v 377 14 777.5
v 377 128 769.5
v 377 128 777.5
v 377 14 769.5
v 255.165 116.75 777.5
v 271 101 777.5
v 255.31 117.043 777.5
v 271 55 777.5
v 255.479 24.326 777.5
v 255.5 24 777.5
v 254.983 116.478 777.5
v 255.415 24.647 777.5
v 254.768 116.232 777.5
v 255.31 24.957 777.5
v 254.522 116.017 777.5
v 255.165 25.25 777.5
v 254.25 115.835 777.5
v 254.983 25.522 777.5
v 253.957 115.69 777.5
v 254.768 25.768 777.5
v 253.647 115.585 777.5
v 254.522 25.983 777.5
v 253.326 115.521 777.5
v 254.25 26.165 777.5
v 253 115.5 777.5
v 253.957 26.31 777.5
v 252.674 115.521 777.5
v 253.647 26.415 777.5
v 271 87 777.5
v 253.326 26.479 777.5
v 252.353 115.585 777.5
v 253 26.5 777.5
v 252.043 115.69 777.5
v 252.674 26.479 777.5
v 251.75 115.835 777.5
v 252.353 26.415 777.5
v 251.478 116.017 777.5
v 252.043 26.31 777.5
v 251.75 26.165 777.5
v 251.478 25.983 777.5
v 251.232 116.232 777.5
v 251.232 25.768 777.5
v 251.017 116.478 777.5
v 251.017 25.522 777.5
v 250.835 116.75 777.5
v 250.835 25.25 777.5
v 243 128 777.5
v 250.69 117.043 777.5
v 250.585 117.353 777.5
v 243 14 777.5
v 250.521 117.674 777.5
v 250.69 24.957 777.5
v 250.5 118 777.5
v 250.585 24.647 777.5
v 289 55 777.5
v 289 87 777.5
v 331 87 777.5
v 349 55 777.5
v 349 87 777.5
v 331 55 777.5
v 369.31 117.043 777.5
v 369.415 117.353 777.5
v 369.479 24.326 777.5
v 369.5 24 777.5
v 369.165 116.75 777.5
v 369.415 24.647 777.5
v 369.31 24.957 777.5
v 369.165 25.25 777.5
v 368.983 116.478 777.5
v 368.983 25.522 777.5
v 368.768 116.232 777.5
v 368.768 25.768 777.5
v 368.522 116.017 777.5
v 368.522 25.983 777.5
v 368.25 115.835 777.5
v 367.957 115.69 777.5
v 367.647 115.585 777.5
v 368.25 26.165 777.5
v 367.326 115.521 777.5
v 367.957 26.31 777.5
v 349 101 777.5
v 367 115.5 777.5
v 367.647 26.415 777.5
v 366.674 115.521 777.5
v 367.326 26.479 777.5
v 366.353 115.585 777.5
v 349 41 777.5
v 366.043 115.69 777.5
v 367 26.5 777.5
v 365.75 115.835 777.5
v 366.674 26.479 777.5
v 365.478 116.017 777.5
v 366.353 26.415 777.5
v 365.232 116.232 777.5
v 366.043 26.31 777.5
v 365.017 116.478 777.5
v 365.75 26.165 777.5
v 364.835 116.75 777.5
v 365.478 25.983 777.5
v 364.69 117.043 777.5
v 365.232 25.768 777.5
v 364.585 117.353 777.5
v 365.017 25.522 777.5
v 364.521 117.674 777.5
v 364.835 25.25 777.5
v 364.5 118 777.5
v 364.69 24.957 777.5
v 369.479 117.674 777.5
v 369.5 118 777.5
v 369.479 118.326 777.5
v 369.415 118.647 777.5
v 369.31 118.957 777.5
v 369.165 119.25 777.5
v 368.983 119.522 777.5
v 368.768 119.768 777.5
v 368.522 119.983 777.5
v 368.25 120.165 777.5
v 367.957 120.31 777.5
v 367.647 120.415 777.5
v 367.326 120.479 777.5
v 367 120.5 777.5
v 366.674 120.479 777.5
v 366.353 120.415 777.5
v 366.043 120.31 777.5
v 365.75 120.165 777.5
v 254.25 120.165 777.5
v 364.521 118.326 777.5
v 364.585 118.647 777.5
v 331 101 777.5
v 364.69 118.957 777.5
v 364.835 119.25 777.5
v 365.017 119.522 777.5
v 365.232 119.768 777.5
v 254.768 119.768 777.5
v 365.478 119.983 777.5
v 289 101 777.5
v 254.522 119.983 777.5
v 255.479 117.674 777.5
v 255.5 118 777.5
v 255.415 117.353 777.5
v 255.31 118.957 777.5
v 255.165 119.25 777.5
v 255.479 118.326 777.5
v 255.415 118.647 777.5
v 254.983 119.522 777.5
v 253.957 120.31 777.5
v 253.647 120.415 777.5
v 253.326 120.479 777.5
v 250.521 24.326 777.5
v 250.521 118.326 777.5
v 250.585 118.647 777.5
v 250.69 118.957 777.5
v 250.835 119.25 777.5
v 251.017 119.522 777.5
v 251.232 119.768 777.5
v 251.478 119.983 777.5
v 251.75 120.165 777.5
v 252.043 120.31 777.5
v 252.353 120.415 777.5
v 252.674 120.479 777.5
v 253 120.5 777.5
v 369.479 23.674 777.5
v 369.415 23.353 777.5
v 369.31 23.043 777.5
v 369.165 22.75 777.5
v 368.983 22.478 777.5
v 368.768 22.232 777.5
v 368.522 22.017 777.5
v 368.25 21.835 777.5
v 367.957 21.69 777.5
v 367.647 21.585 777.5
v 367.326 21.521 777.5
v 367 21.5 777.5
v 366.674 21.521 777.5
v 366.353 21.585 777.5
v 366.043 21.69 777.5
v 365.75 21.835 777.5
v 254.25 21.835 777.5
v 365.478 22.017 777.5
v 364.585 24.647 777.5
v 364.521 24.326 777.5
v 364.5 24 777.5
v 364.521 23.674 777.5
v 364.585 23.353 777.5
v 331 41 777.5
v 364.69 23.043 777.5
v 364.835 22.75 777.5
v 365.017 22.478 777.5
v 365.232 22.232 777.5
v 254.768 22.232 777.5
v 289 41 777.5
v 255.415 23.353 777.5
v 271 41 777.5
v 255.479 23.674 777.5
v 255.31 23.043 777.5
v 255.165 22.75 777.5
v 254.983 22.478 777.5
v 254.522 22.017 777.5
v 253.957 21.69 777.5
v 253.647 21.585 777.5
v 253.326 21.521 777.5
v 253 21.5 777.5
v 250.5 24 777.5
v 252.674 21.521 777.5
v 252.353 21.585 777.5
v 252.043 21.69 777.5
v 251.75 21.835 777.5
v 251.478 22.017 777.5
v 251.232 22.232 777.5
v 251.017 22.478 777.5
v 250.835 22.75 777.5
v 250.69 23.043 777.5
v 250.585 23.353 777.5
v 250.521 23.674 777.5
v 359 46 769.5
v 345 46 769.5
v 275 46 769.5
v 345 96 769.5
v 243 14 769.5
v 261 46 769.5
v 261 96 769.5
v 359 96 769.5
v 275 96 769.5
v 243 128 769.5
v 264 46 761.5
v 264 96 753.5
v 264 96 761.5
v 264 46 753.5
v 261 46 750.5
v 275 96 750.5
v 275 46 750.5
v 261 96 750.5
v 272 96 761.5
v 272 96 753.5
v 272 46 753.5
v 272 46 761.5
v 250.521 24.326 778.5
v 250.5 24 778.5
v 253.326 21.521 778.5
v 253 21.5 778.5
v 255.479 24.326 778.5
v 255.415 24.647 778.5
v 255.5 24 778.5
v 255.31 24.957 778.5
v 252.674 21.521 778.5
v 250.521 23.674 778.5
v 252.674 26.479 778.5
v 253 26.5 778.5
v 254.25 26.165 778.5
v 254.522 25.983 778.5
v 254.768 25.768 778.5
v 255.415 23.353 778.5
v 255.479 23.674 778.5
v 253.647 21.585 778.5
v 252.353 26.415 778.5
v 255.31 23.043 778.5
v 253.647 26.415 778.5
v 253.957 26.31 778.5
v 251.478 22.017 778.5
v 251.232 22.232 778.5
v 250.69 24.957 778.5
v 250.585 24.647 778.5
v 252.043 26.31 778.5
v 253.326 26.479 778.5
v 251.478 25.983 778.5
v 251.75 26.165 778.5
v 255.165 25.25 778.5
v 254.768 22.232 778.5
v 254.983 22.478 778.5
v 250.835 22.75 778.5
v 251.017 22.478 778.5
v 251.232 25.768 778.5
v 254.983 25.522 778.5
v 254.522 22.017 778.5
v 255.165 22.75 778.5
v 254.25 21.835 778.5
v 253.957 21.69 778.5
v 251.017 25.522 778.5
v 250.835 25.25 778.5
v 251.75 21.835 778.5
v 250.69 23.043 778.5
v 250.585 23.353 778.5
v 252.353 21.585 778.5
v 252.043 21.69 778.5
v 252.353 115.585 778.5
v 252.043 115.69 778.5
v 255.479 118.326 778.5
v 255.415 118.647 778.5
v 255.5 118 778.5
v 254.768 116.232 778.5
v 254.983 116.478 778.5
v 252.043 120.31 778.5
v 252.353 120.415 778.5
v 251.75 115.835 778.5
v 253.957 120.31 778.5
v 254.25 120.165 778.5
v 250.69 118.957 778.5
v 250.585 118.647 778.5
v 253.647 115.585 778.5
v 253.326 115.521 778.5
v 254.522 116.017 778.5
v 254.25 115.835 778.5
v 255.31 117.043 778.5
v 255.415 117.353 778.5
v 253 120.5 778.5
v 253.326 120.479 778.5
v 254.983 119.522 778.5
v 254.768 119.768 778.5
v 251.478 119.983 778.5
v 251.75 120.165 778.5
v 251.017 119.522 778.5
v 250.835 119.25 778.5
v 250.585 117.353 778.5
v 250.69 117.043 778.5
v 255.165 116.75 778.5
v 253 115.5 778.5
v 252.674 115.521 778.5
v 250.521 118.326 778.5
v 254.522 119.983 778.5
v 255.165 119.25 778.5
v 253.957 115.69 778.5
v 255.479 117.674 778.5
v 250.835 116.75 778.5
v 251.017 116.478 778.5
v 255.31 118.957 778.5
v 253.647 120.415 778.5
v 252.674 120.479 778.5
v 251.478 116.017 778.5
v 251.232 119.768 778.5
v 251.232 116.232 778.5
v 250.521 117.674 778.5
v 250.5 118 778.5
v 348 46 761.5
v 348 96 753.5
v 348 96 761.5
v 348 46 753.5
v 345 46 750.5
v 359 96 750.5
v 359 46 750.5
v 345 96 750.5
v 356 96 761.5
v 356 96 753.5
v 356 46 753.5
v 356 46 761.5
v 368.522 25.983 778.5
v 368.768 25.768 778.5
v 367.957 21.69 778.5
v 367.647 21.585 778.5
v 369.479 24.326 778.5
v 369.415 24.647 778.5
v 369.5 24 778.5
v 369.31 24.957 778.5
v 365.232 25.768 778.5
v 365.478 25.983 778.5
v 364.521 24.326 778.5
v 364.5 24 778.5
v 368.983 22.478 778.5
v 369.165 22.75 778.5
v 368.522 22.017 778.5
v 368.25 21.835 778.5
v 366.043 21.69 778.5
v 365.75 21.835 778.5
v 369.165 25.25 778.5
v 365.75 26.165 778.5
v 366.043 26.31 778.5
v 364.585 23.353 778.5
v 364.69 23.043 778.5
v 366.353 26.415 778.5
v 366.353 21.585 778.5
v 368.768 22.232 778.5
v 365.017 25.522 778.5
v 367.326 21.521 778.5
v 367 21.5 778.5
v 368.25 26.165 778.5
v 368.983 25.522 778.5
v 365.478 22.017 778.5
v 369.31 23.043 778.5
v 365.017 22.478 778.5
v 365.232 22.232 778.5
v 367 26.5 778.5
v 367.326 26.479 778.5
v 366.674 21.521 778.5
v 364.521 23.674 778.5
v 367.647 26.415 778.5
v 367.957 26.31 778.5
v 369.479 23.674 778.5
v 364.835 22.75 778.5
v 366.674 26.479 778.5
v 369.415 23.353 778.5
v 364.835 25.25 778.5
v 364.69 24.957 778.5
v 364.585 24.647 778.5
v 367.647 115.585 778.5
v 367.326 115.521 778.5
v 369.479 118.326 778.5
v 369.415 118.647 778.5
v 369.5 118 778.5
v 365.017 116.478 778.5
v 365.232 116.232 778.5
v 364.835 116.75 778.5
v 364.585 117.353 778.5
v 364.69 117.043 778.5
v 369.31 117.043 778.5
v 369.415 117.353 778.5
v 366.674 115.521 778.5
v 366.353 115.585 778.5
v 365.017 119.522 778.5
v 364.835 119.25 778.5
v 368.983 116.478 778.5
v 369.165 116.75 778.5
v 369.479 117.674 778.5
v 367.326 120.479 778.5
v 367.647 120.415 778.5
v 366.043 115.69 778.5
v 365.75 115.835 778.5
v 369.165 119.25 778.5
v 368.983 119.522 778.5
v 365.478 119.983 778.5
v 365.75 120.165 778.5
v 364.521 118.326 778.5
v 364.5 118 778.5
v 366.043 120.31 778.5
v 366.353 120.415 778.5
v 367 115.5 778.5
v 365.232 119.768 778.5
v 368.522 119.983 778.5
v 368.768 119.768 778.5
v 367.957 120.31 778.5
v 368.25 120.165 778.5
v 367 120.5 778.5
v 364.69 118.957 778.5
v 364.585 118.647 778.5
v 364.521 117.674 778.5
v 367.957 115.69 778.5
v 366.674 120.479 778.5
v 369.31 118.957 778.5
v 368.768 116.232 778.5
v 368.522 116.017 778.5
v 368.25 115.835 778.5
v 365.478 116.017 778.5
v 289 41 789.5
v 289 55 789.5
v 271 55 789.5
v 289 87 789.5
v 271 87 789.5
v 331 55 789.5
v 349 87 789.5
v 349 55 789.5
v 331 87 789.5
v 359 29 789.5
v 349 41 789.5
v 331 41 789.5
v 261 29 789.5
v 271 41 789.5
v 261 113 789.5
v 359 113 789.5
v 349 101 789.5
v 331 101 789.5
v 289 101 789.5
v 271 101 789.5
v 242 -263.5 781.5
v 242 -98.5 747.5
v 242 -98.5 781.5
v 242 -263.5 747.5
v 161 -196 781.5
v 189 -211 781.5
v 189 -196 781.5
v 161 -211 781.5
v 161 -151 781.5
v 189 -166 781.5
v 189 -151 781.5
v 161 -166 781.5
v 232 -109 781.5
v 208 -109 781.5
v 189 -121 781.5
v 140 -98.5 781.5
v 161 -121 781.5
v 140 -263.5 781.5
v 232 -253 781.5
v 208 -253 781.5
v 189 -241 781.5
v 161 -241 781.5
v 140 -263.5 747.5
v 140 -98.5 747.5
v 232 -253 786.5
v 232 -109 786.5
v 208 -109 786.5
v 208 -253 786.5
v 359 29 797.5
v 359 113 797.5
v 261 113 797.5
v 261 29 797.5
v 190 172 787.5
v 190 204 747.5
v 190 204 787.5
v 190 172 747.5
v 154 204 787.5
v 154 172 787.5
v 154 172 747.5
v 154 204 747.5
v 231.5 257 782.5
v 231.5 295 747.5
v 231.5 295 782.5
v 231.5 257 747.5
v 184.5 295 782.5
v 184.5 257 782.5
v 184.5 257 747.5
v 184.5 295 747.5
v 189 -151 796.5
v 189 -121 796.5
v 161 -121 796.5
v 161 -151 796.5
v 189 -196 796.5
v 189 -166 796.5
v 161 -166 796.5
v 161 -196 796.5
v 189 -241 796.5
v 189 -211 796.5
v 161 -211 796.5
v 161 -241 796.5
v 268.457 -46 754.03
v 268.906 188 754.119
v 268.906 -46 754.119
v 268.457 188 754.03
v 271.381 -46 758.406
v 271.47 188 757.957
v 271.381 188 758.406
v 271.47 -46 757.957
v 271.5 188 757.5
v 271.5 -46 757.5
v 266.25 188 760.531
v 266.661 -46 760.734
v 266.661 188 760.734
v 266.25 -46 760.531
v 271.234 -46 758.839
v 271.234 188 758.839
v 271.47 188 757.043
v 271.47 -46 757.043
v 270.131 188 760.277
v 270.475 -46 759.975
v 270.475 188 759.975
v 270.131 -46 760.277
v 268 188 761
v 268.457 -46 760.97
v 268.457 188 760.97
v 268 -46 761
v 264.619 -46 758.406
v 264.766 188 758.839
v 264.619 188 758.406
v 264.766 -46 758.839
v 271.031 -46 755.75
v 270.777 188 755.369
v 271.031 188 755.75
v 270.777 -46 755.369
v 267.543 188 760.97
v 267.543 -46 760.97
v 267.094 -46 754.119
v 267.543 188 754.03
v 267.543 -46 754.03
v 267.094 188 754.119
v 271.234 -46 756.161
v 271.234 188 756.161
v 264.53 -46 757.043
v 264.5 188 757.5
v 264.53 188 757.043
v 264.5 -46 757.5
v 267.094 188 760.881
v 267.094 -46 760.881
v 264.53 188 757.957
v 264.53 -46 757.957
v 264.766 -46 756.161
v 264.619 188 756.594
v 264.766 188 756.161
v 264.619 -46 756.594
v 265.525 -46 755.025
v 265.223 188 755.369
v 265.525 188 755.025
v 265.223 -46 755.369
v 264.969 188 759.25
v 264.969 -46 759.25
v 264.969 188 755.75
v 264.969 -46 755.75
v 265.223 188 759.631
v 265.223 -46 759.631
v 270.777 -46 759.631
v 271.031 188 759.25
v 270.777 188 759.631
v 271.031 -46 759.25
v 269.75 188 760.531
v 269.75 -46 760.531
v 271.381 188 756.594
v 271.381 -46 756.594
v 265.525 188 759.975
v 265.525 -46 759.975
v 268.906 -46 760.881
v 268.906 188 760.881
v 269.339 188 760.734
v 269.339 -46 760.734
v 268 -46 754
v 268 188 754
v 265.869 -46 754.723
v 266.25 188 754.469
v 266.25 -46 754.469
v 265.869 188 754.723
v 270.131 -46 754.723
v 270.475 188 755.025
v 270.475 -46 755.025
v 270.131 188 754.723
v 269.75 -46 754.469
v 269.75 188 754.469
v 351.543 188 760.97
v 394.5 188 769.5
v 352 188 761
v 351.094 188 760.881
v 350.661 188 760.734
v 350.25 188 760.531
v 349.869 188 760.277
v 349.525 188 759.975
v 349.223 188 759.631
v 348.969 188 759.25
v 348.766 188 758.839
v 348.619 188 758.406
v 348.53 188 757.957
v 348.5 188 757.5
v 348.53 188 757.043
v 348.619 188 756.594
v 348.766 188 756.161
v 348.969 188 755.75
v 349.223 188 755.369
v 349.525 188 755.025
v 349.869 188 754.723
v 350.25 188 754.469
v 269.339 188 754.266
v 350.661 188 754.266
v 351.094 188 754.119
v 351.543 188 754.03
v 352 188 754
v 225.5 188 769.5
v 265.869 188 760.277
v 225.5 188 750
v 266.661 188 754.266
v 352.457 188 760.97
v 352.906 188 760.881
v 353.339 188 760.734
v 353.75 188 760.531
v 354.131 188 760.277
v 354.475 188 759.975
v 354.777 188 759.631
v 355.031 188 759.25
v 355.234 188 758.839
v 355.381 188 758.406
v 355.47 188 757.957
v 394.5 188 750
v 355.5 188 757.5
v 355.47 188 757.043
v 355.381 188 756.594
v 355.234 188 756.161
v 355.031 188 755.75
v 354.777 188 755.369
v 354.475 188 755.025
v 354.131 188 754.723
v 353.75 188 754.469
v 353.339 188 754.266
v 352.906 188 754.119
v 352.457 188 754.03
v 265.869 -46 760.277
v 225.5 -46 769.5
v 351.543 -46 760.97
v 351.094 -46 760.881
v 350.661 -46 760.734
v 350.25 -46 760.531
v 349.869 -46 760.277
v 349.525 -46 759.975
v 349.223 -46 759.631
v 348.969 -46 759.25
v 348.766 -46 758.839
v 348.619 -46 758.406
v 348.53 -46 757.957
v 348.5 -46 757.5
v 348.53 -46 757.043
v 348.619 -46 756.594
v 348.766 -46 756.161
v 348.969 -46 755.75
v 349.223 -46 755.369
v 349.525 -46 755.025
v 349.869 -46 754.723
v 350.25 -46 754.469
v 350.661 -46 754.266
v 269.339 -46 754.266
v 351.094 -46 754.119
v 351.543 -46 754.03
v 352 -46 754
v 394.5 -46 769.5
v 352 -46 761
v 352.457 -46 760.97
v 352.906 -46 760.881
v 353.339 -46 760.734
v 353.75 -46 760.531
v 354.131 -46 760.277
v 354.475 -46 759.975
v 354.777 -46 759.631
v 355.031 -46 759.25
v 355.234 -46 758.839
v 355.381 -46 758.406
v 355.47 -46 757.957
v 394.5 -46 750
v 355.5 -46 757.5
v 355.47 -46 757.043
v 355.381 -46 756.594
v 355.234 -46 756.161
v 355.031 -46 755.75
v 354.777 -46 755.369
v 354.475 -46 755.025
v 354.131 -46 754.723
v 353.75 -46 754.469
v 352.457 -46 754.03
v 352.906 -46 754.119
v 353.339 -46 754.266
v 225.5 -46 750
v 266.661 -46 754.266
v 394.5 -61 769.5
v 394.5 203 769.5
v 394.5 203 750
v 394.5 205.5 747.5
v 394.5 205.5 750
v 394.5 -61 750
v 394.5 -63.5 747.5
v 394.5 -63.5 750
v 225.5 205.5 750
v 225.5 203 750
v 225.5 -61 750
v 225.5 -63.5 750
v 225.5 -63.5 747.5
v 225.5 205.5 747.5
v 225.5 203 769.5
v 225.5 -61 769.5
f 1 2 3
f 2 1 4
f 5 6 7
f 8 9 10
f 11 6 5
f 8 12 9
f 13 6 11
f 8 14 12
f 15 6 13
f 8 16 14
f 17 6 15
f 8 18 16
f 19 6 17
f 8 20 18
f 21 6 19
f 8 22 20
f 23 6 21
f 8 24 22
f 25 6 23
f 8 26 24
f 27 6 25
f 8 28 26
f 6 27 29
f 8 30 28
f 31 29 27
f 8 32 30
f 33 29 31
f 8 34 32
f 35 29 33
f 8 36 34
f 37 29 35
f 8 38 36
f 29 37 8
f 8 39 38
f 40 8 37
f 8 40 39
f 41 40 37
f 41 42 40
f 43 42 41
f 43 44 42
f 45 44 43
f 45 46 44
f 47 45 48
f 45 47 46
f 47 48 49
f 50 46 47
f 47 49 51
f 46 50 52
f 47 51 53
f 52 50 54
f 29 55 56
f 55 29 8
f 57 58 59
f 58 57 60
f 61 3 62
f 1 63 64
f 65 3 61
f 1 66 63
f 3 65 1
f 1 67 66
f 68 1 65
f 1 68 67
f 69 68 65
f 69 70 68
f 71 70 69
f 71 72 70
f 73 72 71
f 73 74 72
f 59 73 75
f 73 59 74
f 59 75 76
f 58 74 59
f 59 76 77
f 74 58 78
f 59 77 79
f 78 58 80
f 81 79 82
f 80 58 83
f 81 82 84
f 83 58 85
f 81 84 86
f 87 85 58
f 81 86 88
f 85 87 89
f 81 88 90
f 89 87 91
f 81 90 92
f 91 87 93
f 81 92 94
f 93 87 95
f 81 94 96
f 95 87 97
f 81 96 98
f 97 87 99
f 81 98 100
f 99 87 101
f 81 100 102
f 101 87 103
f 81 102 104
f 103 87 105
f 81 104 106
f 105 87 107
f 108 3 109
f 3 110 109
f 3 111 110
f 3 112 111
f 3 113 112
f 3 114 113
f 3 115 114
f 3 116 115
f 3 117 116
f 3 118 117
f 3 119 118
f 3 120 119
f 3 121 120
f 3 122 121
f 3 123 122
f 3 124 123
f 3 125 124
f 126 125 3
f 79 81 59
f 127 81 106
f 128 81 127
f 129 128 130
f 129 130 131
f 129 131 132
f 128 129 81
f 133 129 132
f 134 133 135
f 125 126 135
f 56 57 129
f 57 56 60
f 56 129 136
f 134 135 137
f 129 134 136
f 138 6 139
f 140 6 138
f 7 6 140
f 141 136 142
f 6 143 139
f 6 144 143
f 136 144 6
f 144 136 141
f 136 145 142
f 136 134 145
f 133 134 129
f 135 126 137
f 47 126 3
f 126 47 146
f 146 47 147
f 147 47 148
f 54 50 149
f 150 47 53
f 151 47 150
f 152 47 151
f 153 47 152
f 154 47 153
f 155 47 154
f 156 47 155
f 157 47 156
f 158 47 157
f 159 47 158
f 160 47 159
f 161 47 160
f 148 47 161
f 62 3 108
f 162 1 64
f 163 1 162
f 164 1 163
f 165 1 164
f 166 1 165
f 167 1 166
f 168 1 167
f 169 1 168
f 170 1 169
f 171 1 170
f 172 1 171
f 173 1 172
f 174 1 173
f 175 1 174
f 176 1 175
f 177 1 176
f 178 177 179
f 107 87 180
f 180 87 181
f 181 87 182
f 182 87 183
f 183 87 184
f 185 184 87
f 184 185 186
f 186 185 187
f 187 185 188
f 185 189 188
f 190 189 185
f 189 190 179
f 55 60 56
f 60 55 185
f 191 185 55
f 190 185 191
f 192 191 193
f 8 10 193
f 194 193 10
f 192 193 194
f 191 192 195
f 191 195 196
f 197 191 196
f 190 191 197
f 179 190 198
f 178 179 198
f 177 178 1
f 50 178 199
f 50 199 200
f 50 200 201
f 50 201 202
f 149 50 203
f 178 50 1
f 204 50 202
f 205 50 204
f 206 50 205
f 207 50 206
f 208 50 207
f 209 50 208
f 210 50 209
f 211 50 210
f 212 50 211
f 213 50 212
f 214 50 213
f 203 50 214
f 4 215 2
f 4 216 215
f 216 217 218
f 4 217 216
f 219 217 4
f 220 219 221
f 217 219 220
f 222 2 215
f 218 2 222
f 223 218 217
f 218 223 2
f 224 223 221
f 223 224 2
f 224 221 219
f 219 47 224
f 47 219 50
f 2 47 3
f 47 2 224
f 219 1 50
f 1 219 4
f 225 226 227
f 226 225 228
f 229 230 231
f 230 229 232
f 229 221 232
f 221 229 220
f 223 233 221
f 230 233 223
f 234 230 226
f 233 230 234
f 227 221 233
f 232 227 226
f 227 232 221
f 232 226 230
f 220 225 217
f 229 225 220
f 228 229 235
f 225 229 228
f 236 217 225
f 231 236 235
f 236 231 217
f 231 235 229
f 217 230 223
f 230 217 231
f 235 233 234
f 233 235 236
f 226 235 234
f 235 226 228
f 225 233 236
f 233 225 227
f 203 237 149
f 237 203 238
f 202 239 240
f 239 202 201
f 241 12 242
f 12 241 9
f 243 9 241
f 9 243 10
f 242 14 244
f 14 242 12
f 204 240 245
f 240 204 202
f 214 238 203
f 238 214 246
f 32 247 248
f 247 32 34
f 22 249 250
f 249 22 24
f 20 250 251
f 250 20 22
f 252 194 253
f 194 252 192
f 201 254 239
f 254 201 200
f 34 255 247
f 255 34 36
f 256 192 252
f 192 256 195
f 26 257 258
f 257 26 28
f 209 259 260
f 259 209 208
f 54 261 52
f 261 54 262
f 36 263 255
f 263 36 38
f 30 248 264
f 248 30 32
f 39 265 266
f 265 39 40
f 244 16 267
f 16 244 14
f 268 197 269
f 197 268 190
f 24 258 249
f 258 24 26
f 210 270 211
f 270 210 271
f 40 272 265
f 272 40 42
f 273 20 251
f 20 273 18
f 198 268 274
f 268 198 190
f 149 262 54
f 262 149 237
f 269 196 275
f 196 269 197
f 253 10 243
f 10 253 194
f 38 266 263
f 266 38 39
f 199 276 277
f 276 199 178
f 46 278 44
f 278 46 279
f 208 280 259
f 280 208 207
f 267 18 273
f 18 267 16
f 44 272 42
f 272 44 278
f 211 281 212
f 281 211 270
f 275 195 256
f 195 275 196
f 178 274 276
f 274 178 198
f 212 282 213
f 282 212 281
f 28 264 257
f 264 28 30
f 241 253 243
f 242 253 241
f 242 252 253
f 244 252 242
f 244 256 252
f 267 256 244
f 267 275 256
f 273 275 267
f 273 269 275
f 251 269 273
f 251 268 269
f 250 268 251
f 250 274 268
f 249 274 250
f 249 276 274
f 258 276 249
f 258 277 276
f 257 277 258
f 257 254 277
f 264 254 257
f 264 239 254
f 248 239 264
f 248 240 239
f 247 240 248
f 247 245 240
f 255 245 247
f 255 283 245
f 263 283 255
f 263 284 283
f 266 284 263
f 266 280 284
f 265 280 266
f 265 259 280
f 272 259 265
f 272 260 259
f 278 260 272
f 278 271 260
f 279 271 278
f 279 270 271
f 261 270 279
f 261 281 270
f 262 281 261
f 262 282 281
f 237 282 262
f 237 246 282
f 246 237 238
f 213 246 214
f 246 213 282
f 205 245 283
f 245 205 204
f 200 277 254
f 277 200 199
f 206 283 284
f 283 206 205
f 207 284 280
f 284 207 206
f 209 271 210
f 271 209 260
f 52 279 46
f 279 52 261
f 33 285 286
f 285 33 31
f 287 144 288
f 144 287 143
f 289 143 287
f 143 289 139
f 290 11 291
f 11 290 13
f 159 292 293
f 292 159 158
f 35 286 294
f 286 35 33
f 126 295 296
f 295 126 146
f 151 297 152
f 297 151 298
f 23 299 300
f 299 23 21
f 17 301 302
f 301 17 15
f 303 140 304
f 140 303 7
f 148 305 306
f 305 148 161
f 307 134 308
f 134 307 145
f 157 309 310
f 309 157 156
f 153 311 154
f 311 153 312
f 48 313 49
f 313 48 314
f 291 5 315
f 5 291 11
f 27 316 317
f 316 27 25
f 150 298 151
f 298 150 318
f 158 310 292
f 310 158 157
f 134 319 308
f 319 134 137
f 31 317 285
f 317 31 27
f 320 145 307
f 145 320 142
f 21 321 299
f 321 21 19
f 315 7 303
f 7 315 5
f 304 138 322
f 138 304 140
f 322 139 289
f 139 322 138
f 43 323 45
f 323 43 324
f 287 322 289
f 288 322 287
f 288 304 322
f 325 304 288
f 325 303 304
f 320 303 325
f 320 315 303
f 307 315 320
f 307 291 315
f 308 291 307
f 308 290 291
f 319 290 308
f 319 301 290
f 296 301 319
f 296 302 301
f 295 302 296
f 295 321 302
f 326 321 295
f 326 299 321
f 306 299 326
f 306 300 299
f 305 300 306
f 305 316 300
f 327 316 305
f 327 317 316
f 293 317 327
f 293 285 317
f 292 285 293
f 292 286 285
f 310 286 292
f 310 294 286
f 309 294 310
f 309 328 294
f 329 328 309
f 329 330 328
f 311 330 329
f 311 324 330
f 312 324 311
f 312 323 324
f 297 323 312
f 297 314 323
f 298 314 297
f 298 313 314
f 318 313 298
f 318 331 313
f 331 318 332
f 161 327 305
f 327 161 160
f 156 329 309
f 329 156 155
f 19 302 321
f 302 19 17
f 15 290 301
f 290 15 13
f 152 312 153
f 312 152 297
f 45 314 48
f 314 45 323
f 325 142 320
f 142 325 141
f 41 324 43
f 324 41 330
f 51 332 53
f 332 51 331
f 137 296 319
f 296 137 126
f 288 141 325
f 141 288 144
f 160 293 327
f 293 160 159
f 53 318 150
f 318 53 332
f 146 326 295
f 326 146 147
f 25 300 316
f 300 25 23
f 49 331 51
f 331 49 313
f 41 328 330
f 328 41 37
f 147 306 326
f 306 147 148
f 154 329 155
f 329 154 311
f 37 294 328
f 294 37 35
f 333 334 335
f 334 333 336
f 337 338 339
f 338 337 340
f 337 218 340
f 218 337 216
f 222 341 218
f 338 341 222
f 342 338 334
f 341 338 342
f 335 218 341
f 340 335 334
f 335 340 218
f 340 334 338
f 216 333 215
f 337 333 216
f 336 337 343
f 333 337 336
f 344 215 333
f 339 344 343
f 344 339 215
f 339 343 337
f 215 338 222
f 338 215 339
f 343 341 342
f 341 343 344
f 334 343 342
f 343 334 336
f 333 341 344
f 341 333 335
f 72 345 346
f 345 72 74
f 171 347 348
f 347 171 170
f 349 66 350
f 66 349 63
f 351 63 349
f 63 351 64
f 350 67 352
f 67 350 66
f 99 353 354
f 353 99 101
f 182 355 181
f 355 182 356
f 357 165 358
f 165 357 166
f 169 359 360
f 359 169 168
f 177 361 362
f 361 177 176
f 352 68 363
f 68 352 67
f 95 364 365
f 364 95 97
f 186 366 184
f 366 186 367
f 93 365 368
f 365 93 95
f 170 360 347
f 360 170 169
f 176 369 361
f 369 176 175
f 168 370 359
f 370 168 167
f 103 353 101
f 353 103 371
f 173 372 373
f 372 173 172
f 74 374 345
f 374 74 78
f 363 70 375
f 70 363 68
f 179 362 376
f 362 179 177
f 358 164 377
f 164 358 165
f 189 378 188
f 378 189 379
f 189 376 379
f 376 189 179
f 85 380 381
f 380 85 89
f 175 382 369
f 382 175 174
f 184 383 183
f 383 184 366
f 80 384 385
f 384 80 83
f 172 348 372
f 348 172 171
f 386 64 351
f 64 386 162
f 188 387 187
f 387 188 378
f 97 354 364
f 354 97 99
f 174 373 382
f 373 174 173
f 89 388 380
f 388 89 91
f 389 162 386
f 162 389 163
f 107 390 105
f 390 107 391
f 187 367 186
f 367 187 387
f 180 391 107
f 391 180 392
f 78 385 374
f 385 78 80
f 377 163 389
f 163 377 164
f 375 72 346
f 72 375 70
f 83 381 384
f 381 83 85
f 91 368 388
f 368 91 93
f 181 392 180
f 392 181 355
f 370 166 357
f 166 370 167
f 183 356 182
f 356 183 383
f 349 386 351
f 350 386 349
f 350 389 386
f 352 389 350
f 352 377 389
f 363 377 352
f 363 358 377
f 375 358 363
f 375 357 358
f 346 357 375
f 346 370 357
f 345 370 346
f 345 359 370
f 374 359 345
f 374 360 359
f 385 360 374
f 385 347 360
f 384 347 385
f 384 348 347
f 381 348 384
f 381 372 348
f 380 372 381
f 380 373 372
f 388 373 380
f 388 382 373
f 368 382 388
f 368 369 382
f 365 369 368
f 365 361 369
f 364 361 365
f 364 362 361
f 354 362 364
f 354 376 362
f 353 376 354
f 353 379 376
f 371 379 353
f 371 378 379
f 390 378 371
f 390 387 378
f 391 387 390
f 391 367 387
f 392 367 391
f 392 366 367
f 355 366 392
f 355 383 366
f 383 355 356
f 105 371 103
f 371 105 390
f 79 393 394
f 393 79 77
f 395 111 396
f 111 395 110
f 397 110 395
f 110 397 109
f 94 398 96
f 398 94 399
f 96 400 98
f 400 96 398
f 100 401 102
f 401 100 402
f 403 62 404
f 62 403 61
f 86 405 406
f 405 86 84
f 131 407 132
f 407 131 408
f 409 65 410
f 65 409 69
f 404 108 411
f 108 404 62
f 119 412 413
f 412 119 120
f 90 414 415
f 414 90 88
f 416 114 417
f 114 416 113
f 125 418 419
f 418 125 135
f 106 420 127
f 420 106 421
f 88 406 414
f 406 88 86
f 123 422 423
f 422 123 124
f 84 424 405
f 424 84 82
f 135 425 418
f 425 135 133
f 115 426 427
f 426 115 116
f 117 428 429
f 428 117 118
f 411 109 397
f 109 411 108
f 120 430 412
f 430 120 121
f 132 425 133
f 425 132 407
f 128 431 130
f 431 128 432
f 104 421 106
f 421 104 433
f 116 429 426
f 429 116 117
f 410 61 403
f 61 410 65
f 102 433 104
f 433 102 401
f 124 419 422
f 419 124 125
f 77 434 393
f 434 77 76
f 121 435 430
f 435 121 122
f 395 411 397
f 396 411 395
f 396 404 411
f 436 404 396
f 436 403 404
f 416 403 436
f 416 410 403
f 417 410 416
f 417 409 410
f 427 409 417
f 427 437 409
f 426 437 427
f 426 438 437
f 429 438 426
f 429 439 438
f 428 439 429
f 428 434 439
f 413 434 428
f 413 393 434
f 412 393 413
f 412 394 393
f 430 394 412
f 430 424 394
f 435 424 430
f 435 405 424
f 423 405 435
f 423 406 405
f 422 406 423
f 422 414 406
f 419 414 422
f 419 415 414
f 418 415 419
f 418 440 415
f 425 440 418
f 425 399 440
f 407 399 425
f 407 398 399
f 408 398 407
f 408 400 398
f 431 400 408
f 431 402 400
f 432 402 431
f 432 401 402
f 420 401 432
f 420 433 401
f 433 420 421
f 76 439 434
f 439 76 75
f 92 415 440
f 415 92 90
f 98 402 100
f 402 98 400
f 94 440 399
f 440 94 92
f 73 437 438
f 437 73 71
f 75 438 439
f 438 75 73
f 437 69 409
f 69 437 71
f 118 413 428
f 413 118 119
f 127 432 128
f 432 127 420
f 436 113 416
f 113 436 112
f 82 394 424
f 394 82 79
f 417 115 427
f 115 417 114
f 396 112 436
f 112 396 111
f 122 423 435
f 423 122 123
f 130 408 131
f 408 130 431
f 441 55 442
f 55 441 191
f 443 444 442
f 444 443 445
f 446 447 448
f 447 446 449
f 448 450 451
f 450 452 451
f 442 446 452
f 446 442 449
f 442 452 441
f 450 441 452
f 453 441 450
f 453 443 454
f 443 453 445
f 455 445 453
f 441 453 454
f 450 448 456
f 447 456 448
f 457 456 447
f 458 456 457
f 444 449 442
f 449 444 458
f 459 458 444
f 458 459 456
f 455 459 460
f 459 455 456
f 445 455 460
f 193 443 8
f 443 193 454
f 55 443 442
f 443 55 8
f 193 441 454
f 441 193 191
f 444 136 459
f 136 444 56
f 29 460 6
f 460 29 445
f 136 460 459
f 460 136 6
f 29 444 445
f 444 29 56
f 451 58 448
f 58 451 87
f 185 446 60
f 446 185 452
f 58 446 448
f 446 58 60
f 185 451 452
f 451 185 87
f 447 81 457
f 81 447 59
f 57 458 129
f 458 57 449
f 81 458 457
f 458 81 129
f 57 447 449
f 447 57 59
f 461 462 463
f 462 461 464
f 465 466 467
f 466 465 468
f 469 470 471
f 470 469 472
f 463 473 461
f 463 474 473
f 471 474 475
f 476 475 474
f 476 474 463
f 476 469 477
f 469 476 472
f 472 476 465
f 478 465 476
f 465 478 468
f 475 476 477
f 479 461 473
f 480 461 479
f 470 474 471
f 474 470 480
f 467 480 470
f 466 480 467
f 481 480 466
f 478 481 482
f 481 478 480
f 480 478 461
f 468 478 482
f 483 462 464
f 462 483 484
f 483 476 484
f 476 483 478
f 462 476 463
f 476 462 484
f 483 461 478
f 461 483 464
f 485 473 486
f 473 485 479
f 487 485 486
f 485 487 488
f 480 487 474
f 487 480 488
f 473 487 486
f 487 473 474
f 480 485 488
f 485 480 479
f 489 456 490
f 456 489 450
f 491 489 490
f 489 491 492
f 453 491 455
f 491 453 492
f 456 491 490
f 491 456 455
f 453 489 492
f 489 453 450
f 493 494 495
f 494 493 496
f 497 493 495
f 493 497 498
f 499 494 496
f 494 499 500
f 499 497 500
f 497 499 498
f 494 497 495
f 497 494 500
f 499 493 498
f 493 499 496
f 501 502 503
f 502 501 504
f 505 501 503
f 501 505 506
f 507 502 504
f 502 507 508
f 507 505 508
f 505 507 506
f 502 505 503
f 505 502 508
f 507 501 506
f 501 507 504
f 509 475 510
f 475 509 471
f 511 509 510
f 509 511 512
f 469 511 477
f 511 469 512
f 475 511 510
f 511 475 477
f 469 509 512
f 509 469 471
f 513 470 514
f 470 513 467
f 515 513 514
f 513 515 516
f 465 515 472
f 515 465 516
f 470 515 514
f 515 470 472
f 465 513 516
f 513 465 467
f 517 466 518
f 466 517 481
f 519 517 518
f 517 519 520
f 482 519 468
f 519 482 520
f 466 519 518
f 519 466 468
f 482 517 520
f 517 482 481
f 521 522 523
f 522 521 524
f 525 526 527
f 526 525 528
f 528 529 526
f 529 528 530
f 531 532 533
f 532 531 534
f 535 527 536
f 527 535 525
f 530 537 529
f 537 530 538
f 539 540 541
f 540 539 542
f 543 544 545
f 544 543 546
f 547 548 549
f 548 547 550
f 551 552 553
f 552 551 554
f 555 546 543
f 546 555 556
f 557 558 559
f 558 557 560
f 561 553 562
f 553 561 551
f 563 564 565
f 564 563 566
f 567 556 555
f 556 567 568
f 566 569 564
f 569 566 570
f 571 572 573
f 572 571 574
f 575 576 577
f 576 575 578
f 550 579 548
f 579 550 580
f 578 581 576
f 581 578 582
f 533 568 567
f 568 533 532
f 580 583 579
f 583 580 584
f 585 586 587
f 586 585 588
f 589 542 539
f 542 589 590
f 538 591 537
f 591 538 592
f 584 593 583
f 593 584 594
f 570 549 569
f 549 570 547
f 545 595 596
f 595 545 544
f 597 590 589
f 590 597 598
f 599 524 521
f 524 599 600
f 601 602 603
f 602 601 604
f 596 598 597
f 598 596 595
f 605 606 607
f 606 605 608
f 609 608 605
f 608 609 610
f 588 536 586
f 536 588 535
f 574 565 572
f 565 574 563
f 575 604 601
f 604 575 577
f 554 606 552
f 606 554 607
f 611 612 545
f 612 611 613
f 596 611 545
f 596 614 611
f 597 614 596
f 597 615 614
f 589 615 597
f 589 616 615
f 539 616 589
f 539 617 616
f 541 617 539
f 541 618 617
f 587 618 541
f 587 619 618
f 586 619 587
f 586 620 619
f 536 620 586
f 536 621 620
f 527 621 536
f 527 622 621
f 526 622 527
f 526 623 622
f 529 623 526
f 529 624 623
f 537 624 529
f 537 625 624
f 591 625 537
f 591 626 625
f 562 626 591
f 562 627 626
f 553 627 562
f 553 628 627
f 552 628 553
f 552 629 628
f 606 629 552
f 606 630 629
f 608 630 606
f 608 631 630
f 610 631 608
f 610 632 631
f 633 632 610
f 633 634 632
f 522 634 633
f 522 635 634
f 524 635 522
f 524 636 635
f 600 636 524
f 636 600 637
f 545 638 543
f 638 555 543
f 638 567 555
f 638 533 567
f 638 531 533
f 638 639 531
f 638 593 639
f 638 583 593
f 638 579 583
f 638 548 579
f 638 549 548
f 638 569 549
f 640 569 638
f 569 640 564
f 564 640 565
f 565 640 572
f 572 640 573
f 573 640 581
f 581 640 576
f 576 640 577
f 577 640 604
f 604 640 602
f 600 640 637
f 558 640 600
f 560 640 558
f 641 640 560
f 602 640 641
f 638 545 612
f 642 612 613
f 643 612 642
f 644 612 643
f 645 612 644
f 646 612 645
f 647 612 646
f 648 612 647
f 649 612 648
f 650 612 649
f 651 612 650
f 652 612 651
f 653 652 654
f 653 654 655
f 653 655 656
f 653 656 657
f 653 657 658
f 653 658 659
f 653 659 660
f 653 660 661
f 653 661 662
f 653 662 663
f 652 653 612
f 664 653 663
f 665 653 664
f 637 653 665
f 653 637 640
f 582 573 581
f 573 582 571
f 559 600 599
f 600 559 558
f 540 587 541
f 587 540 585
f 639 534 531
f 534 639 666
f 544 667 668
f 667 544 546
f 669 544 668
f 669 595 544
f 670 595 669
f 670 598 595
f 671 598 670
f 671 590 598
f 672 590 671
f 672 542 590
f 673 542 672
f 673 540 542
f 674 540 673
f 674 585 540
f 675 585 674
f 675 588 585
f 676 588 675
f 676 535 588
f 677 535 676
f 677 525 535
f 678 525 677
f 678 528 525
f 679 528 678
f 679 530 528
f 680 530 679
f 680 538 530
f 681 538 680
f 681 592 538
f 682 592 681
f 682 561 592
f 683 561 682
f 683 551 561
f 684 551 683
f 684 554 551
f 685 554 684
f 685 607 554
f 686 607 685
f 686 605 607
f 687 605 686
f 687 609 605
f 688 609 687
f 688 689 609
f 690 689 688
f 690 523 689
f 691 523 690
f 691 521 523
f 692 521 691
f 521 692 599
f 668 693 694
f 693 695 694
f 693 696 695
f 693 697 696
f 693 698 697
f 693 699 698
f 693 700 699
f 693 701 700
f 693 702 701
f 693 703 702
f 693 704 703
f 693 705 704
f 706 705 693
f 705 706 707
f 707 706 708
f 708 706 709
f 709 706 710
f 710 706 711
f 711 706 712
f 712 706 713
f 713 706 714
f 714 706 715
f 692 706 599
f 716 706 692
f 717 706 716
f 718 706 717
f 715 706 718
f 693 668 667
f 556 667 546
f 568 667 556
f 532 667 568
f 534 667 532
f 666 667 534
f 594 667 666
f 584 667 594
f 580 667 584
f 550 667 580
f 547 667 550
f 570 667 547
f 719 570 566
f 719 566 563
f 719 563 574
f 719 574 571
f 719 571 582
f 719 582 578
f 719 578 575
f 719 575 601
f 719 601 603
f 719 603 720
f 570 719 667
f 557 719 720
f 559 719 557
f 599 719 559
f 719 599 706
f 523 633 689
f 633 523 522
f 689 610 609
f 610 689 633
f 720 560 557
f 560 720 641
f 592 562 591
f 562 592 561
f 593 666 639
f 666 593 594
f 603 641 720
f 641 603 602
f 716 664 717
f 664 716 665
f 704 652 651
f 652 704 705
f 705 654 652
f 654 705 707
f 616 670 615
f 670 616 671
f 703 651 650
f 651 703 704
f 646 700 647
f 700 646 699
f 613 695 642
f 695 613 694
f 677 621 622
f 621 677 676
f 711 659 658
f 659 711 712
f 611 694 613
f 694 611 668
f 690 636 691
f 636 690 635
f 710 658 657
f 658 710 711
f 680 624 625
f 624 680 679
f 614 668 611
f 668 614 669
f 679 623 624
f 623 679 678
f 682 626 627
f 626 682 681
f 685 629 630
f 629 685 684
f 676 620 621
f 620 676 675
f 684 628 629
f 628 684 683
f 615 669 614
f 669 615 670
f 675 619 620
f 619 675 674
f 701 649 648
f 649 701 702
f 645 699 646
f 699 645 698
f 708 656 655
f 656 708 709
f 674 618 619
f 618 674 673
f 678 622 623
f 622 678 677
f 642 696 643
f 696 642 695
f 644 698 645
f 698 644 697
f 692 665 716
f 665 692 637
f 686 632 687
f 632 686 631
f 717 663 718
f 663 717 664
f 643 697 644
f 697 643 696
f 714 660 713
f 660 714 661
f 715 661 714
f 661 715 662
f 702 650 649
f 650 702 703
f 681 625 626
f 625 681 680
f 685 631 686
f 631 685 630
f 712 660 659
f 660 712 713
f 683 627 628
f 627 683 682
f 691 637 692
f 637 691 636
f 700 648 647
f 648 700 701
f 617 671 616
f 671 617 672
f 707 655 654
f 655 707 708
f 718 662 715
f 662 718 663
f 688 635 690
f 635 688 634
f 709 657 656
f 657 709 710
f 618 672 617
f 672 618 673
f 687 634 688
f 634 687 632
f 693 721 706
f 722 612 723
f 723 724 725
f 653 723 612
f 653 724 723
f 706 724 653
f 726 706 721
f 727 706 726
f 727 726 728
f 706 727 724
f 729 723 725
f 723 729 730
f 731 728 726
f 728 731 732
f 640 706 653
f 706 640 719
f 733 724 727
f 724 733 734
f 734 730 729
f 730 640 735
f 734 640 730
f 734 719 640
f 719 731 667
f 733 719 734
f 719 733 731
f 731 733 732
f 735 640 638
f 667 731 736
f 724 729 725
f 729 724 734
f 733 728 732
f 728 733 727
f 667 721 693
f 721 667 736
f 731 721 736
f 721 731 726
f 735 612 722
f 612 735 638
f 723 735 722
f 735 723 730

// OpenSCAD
// Millimetre geometric reference; use real functional tools, not printed heated or cutting equipment.
// Source SHA-256: 32715d75c7106ffe74180650626e3089851e002b0ab85a81887b5b09d376a55f
$fn=48;
module scale_carriage(){
translate([0, 0, 11]) rotate([0, 0, 0]) cube([134, 114, 8],center=true);
translate([-47.5, 0, -5]) rotate([0, 0, 0]) cube([3, 50, 14],center=true);
translate([-36.5, 0, -5]) rotate([0, 0, 0]) cube([3, 50, 14],center=true);
translate([-42, 0, -10.5]) rotate([0, 0, 0]) cube([8, 50, 3],center=true);
translate([-42, 0, 0.5]) rotate([0, 0, 0]) cube([8, 50, 3],center=true);
translate([-42, 0, 4.5]) rotate([0, 0, 0]) cube([14, 50, 6],center=true);
translate([-57, -47, 15.5]) rotate([0, 0, 0]) cylinder(r=2.5,h=1,center=true);
translate([-57, 47, 15.5]) rotate([0, 0, 0]) cylinder(r=2.5,h=1,center=true);
translate([36.5, 0, -5]) rotate([0, 0, 0]) cube([3, 50, 14],center=true);
translate([47.5, 0, -5]) rotate([0, 0, 0]) cube([3, 50, 14],center=true);
translate([42, 0, -10.5]) rotate([0, 0, 0]) cube([8, 50, 3],center=true);
translate([42, 0, 0.5]) rotate([0, 0, 0]) cube([8, 50, 3],center=true);
translate([42, 0, 4.5]) rotate([0, 0, 0]) cube([14, 50, 6],center=true);
translate([57, -47, 15.5]) rotate([0, 0, 0]) cylinder(r=2.5,h=1,center=true);
translate([57, 47, 15.5]) rotate([0, 0, 0]) cylinder(r=2.5,h=1,center=true);
translate([-30, -23, 21]) rotate([0, 0, 0]) cube([18, 14, 12],center=true);
translate([-30, 23, 21]) rotate([0, 0, 0]) cube([18, 14, 12],center=true);
translate([30, -23, 21]) rotate([0, 0, 0]) cube([18, 14, 12],center=true);
translate([30, 23, 21]) rotate([0, 0, 0]) cube([18, 14, 12],center=true);
}
module weighing_pan(){
translate([0, 0, 0]) rotate([0, 0, 0]) cube([98, 84, 8],center=true);
}
module reference_weight(){
translate([0, 0, 0]) rotate([0, 0, 0]) cube([36, 32, 40],center=true);
}
module verification_pack(){
translate([0, 0, 0]) rotate([0, 0, 0]) cube([47, 38, 35],center=true);
}
module scale_panel(){
translate([0, 0, 0]) rotate([0, 0, 0]) cube([102, 165, 34],center=true);
translate([29, 0, 19.5]) rotate([0, 0, 0]) cube([24, 144, 5],center=true);
}
module zero_button(){
translate([0, 0, 0]) rotate([0, 0, 0]) cube([28, 30, 18],center=true);
}
module span_button(){
translate([0, 0, 0]) rotate([0, 0, 0]) cube([28, 30, 18],center=true);
}
module verify_button(){
translate([0, 0, 0]) rotate([0, 0, 0]) cube([28, 30, 18],center=true);
}
module scale_carriage_rail_left(){
translate([0, 0, 0]) rotate([0, 0, 0]) rotate([90,0,0]) cylinder(r=3.5,h=234,center=true);
}
module scale_carriage_rail_right(){
translate([0, 0, 0]) rotate([0, 0, 0]) rotate([90,0,0]) cylinder(r=3.5,h=234,center=true);
}
module scale_carriage_base(){
translate([0, 0, 0]) rotate([0, 0, 0]) cube([169, 269, 2.5],center=true);
}
module scale_carriage_end_front(){
translate([0, 0, 0]) rotate([0, 0, 0]) cube([169, 15, 22],center=true);
}
module scale_carriage_end_back(){
translate([0, 0, 0]) rotate([0, 0, 0]) cube([169, 15, 22],center=true);
}
translate([310, 71, 762.5]) rotate([0,0,0]) scale_carriage();
translate([310, 71, 793.5]) rotate([0,0,0]) weighing_pan();
translate([172, 188, 767.5]) rotate([0,0,0]) reference_weight();
translate([208, 276, 765]) rotate([0,0,0]) verification_pack();
translate([191, -181, 764.5]) rotate([0,0,0]) scale_panel();
translate([175, -136, 787.5]) rotate([0,0,0]) zero_button();
translate([175, -181, 787.5]) rotate([0,0,0]) span_button();
translate([175, -226, 787.5]) rotate([0,0,0]) verify_button();
translate([268, 71, 757.5]) rotate([0,0,0]) scale_carriage_rail_left();
translate([352, 71, 757.5]) rotate([0,0,0]) scale_carriage_rail_right();
translate([310, 71, 748.75]) rotate([0,0,0]) scale_carriage_base();
translate([310, -53.5, 758.5]) rotate([0,0,0]) scale_carriage_end_front();
translate([310, 195.5, 758.5]) rotate([0,0,0]) scale_carriage_end_back();
